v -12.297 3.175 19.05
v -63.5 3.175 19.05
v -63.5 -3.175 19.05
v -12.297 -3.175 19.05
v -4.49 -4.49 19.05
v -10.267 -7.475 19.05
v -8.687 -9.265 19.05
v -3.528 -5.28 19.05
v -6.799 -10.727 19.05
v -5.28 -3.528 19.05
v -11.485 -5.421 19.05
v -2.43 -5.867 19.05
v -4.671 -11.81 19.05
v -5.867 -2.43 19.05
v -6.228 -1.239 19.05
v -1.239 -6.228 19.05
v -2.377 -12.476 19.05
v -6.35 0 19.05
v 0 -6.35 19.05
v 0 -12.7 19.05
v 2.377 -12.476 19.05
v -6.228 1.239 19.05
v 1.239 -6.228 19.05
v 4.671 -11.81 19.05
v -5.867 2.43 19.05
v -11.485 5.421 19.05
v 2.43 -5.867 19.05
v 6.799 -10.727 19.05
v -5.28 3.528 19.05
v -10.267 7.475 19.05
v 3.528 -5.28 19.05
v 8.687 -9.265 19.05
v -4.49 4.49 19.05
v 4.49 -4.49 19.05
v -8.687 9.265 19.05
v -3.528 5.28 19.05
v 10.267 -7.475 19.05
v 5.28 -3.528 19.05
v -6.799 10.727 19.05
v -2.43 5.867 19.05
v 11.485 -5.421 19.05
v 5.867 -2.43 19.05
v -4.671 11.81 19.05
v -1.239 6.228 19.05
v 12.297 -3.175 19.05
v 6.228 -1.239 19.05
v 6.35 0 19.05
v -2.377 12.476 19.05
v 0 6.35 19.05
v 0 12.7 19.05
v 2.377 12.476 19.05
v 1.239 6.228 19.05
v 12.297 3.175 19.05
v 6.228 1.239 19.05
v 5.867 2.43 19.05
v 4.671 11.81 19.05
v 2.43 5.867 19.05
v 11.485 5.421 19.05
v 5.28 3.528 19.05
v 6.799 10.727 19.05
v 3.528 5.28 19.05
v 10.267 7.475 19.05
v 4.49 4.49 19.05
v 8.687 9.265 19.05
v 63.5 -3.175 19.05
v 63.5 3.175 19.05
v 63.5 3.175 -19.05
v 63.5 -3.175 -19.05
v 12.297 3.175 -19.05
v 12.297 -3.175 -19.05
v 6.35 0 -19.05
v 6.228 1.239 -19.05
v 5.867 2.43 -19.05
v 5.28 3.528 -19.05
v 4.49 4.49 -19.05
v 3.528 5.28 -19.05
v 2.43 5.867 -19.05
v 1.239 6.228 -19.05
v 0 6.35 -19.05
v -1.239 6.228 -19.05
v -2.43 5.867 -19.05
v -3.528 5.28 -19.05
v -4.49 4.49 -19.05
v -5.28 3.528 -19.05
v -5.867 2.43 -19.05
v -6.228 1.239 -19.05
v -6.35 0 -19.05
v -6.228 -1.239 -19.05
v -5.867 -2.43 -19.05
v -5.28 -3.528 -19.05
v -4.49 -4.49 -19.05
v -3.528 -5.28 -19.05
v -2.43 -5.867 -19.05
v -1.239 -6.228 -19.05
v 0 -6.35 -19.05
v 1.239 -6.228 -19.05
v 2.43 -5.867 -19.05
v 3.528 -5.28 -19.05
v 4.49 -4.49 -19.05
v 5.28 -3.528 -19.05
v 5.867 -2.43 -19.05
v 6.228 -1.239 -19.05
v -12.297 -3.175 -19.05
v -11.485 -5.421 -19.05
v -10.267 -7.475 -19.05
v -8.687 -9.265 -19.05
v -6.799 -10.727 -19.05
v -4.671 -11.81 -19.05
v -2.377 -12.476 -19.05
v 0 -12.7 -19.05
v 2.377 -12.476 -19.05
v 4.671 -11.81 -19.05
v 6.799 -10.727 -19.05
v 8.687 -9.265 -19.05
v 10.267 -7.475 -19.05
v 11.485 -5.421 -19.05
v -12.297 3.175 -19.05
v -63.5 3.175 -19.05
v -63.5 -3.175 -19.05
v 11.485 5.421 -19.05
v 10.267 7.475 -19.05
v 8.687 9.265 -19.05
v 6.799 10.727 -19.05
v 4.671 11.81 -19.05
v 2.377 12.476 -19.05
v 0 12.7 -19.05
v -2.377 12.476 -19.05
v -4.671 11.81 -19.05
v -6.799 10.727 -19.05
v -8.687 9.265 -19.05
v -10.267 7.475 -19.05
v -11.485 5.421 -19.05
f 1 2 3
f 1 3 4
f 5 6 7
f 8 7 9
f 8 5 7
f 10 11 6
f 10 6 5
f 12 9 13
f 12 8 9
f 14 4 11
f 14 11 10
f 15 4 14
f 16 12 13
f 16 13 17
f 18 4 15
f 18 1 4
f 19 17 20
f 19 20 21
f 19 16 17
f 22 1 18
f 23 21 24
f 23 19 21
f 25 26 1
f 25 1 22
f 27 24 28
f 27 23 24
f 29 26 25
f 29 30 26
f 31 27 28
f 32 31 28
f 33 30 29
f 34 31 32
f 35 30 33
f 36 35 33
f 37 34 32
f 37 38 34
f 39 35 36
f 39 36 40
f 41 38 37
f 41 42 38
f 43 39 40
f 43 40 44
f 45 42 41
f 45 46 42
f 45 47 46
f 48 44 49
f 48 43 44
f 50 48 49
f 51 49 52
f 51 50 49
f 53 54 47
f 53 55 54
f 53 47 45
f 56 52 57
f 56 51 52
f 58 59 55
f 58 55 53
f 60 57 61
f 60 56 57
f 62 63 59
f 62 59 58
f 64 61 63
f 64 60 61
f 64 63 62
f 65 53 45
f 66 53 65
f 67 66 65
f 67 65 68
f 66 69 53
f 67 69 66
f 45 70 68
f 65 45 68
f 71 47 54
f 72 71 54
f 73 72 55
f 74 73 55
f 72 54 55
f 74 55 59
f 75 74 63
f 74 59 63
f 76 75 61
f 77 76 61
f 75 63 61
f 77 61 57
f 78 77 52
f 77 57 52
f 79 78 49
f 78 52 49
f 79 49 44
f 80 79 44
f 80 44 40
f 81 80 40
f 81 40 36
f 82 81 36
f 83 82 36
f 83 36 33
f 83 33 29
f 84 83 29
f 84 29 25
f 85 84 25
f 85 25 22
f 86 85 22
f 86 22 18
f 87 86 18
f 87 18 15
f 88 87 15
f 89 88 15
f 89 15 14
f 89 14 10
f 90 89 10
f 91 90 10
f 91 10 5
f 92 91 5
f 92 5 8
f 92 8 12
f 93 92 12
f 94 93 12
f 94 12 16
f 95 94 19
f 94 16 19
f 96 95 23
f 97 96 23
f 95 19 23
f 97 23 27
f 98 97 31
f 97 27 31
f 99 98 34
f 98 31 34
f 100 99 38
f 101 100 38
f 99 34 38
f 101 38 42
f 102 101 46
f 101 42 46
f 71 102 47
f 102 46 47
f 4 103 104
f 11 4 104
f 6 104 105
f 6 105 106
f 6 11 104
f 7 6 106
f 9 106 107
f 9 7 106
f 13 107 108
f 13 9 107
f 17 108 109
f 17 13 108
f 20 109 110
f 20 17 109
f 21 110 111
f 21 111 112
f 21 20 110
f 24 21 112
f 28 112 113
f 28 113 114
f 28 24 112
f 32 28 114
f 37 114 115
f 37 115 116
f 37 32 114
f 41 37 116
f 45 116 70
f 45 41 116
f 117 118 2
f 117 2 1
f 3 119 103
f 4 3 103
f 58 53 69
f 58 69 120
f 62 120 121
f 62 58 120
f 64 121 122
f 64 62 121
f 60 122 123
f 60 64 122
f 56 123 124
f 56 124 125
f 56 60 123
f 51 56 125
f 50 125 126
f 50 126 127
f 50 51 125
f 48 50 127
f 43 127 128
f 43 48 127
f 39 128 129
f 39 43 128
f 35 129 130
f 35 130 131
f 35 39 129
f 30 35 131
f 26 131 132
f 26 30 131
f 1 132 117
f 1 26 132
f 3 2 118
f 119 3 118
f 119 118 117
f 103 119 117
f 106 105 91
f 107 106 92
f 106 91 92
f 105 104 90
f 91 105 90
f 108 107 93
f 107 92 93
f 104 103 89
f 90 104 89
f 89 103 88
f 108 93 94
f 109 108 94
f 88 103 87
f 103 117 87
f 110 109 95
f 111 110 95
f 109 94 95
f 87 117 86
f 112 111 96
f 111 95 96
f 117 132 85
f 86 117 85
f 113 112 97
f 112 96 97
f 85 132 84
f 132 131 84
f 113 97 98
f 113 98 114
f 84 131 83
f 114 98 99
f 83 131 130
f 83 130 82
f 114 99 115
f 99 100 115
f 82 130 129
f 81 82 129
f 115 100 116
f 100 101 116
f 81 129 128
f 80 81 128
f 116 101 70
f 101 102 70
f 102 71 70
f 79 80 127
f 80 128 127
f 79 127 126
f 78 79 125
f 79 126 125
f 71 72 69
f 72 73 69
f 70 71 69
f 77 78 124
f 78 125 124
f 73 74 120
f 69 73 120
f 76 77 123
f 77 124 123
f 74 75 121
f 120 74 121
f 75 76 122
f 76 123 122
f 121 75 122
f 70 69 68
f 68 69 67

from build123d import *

# Parameters (mm, degrees)
SKETCH1_W           = 127
SKETCH1_H           = 38.1
BOSS_EXTRUDE1_DEPTH = 3.175
SKETCH3_R           = 12.7
BOSS_EXTRUDE2_DEPTH = 38.1
SKETCH4_R           = 6.35
CUT_EXTRUDE1_DEPTH  = 76.134213245


with BuildPart() as part:
    # Sketch1 → Boss-Extrude1 (new, symmetric)
    with BuildSketch(Plane(origin=(0, 0, 0), x_dir=(1, 0, 0), z_dir=(0, 1, 0))):
        Rectangle(SKETCH1_W, SKETCH1_H)
    extrude(amount=BOSS_EXTRUDE1_DEPTH, both=True)

    # Sketch3 → Boss-Extrude2 (add)
    with BuildSketch(Plane.XY.offset(19.05)):
        Circle(SKETCH3_R)
    extrude(amount=-BOSS_EXTRUDE2_DEPTH)

    # Sketch4 → Cut-Extrude1 (cut, through all)
    with BuildSketch(Plane.XY.offset(19.05)):
        Circle(SKETCH4_R)
    extrude(amount=-CUT_EXTRUDE1_DEPTH, mode=Mode.SUBTRACT)


solid = part.part
